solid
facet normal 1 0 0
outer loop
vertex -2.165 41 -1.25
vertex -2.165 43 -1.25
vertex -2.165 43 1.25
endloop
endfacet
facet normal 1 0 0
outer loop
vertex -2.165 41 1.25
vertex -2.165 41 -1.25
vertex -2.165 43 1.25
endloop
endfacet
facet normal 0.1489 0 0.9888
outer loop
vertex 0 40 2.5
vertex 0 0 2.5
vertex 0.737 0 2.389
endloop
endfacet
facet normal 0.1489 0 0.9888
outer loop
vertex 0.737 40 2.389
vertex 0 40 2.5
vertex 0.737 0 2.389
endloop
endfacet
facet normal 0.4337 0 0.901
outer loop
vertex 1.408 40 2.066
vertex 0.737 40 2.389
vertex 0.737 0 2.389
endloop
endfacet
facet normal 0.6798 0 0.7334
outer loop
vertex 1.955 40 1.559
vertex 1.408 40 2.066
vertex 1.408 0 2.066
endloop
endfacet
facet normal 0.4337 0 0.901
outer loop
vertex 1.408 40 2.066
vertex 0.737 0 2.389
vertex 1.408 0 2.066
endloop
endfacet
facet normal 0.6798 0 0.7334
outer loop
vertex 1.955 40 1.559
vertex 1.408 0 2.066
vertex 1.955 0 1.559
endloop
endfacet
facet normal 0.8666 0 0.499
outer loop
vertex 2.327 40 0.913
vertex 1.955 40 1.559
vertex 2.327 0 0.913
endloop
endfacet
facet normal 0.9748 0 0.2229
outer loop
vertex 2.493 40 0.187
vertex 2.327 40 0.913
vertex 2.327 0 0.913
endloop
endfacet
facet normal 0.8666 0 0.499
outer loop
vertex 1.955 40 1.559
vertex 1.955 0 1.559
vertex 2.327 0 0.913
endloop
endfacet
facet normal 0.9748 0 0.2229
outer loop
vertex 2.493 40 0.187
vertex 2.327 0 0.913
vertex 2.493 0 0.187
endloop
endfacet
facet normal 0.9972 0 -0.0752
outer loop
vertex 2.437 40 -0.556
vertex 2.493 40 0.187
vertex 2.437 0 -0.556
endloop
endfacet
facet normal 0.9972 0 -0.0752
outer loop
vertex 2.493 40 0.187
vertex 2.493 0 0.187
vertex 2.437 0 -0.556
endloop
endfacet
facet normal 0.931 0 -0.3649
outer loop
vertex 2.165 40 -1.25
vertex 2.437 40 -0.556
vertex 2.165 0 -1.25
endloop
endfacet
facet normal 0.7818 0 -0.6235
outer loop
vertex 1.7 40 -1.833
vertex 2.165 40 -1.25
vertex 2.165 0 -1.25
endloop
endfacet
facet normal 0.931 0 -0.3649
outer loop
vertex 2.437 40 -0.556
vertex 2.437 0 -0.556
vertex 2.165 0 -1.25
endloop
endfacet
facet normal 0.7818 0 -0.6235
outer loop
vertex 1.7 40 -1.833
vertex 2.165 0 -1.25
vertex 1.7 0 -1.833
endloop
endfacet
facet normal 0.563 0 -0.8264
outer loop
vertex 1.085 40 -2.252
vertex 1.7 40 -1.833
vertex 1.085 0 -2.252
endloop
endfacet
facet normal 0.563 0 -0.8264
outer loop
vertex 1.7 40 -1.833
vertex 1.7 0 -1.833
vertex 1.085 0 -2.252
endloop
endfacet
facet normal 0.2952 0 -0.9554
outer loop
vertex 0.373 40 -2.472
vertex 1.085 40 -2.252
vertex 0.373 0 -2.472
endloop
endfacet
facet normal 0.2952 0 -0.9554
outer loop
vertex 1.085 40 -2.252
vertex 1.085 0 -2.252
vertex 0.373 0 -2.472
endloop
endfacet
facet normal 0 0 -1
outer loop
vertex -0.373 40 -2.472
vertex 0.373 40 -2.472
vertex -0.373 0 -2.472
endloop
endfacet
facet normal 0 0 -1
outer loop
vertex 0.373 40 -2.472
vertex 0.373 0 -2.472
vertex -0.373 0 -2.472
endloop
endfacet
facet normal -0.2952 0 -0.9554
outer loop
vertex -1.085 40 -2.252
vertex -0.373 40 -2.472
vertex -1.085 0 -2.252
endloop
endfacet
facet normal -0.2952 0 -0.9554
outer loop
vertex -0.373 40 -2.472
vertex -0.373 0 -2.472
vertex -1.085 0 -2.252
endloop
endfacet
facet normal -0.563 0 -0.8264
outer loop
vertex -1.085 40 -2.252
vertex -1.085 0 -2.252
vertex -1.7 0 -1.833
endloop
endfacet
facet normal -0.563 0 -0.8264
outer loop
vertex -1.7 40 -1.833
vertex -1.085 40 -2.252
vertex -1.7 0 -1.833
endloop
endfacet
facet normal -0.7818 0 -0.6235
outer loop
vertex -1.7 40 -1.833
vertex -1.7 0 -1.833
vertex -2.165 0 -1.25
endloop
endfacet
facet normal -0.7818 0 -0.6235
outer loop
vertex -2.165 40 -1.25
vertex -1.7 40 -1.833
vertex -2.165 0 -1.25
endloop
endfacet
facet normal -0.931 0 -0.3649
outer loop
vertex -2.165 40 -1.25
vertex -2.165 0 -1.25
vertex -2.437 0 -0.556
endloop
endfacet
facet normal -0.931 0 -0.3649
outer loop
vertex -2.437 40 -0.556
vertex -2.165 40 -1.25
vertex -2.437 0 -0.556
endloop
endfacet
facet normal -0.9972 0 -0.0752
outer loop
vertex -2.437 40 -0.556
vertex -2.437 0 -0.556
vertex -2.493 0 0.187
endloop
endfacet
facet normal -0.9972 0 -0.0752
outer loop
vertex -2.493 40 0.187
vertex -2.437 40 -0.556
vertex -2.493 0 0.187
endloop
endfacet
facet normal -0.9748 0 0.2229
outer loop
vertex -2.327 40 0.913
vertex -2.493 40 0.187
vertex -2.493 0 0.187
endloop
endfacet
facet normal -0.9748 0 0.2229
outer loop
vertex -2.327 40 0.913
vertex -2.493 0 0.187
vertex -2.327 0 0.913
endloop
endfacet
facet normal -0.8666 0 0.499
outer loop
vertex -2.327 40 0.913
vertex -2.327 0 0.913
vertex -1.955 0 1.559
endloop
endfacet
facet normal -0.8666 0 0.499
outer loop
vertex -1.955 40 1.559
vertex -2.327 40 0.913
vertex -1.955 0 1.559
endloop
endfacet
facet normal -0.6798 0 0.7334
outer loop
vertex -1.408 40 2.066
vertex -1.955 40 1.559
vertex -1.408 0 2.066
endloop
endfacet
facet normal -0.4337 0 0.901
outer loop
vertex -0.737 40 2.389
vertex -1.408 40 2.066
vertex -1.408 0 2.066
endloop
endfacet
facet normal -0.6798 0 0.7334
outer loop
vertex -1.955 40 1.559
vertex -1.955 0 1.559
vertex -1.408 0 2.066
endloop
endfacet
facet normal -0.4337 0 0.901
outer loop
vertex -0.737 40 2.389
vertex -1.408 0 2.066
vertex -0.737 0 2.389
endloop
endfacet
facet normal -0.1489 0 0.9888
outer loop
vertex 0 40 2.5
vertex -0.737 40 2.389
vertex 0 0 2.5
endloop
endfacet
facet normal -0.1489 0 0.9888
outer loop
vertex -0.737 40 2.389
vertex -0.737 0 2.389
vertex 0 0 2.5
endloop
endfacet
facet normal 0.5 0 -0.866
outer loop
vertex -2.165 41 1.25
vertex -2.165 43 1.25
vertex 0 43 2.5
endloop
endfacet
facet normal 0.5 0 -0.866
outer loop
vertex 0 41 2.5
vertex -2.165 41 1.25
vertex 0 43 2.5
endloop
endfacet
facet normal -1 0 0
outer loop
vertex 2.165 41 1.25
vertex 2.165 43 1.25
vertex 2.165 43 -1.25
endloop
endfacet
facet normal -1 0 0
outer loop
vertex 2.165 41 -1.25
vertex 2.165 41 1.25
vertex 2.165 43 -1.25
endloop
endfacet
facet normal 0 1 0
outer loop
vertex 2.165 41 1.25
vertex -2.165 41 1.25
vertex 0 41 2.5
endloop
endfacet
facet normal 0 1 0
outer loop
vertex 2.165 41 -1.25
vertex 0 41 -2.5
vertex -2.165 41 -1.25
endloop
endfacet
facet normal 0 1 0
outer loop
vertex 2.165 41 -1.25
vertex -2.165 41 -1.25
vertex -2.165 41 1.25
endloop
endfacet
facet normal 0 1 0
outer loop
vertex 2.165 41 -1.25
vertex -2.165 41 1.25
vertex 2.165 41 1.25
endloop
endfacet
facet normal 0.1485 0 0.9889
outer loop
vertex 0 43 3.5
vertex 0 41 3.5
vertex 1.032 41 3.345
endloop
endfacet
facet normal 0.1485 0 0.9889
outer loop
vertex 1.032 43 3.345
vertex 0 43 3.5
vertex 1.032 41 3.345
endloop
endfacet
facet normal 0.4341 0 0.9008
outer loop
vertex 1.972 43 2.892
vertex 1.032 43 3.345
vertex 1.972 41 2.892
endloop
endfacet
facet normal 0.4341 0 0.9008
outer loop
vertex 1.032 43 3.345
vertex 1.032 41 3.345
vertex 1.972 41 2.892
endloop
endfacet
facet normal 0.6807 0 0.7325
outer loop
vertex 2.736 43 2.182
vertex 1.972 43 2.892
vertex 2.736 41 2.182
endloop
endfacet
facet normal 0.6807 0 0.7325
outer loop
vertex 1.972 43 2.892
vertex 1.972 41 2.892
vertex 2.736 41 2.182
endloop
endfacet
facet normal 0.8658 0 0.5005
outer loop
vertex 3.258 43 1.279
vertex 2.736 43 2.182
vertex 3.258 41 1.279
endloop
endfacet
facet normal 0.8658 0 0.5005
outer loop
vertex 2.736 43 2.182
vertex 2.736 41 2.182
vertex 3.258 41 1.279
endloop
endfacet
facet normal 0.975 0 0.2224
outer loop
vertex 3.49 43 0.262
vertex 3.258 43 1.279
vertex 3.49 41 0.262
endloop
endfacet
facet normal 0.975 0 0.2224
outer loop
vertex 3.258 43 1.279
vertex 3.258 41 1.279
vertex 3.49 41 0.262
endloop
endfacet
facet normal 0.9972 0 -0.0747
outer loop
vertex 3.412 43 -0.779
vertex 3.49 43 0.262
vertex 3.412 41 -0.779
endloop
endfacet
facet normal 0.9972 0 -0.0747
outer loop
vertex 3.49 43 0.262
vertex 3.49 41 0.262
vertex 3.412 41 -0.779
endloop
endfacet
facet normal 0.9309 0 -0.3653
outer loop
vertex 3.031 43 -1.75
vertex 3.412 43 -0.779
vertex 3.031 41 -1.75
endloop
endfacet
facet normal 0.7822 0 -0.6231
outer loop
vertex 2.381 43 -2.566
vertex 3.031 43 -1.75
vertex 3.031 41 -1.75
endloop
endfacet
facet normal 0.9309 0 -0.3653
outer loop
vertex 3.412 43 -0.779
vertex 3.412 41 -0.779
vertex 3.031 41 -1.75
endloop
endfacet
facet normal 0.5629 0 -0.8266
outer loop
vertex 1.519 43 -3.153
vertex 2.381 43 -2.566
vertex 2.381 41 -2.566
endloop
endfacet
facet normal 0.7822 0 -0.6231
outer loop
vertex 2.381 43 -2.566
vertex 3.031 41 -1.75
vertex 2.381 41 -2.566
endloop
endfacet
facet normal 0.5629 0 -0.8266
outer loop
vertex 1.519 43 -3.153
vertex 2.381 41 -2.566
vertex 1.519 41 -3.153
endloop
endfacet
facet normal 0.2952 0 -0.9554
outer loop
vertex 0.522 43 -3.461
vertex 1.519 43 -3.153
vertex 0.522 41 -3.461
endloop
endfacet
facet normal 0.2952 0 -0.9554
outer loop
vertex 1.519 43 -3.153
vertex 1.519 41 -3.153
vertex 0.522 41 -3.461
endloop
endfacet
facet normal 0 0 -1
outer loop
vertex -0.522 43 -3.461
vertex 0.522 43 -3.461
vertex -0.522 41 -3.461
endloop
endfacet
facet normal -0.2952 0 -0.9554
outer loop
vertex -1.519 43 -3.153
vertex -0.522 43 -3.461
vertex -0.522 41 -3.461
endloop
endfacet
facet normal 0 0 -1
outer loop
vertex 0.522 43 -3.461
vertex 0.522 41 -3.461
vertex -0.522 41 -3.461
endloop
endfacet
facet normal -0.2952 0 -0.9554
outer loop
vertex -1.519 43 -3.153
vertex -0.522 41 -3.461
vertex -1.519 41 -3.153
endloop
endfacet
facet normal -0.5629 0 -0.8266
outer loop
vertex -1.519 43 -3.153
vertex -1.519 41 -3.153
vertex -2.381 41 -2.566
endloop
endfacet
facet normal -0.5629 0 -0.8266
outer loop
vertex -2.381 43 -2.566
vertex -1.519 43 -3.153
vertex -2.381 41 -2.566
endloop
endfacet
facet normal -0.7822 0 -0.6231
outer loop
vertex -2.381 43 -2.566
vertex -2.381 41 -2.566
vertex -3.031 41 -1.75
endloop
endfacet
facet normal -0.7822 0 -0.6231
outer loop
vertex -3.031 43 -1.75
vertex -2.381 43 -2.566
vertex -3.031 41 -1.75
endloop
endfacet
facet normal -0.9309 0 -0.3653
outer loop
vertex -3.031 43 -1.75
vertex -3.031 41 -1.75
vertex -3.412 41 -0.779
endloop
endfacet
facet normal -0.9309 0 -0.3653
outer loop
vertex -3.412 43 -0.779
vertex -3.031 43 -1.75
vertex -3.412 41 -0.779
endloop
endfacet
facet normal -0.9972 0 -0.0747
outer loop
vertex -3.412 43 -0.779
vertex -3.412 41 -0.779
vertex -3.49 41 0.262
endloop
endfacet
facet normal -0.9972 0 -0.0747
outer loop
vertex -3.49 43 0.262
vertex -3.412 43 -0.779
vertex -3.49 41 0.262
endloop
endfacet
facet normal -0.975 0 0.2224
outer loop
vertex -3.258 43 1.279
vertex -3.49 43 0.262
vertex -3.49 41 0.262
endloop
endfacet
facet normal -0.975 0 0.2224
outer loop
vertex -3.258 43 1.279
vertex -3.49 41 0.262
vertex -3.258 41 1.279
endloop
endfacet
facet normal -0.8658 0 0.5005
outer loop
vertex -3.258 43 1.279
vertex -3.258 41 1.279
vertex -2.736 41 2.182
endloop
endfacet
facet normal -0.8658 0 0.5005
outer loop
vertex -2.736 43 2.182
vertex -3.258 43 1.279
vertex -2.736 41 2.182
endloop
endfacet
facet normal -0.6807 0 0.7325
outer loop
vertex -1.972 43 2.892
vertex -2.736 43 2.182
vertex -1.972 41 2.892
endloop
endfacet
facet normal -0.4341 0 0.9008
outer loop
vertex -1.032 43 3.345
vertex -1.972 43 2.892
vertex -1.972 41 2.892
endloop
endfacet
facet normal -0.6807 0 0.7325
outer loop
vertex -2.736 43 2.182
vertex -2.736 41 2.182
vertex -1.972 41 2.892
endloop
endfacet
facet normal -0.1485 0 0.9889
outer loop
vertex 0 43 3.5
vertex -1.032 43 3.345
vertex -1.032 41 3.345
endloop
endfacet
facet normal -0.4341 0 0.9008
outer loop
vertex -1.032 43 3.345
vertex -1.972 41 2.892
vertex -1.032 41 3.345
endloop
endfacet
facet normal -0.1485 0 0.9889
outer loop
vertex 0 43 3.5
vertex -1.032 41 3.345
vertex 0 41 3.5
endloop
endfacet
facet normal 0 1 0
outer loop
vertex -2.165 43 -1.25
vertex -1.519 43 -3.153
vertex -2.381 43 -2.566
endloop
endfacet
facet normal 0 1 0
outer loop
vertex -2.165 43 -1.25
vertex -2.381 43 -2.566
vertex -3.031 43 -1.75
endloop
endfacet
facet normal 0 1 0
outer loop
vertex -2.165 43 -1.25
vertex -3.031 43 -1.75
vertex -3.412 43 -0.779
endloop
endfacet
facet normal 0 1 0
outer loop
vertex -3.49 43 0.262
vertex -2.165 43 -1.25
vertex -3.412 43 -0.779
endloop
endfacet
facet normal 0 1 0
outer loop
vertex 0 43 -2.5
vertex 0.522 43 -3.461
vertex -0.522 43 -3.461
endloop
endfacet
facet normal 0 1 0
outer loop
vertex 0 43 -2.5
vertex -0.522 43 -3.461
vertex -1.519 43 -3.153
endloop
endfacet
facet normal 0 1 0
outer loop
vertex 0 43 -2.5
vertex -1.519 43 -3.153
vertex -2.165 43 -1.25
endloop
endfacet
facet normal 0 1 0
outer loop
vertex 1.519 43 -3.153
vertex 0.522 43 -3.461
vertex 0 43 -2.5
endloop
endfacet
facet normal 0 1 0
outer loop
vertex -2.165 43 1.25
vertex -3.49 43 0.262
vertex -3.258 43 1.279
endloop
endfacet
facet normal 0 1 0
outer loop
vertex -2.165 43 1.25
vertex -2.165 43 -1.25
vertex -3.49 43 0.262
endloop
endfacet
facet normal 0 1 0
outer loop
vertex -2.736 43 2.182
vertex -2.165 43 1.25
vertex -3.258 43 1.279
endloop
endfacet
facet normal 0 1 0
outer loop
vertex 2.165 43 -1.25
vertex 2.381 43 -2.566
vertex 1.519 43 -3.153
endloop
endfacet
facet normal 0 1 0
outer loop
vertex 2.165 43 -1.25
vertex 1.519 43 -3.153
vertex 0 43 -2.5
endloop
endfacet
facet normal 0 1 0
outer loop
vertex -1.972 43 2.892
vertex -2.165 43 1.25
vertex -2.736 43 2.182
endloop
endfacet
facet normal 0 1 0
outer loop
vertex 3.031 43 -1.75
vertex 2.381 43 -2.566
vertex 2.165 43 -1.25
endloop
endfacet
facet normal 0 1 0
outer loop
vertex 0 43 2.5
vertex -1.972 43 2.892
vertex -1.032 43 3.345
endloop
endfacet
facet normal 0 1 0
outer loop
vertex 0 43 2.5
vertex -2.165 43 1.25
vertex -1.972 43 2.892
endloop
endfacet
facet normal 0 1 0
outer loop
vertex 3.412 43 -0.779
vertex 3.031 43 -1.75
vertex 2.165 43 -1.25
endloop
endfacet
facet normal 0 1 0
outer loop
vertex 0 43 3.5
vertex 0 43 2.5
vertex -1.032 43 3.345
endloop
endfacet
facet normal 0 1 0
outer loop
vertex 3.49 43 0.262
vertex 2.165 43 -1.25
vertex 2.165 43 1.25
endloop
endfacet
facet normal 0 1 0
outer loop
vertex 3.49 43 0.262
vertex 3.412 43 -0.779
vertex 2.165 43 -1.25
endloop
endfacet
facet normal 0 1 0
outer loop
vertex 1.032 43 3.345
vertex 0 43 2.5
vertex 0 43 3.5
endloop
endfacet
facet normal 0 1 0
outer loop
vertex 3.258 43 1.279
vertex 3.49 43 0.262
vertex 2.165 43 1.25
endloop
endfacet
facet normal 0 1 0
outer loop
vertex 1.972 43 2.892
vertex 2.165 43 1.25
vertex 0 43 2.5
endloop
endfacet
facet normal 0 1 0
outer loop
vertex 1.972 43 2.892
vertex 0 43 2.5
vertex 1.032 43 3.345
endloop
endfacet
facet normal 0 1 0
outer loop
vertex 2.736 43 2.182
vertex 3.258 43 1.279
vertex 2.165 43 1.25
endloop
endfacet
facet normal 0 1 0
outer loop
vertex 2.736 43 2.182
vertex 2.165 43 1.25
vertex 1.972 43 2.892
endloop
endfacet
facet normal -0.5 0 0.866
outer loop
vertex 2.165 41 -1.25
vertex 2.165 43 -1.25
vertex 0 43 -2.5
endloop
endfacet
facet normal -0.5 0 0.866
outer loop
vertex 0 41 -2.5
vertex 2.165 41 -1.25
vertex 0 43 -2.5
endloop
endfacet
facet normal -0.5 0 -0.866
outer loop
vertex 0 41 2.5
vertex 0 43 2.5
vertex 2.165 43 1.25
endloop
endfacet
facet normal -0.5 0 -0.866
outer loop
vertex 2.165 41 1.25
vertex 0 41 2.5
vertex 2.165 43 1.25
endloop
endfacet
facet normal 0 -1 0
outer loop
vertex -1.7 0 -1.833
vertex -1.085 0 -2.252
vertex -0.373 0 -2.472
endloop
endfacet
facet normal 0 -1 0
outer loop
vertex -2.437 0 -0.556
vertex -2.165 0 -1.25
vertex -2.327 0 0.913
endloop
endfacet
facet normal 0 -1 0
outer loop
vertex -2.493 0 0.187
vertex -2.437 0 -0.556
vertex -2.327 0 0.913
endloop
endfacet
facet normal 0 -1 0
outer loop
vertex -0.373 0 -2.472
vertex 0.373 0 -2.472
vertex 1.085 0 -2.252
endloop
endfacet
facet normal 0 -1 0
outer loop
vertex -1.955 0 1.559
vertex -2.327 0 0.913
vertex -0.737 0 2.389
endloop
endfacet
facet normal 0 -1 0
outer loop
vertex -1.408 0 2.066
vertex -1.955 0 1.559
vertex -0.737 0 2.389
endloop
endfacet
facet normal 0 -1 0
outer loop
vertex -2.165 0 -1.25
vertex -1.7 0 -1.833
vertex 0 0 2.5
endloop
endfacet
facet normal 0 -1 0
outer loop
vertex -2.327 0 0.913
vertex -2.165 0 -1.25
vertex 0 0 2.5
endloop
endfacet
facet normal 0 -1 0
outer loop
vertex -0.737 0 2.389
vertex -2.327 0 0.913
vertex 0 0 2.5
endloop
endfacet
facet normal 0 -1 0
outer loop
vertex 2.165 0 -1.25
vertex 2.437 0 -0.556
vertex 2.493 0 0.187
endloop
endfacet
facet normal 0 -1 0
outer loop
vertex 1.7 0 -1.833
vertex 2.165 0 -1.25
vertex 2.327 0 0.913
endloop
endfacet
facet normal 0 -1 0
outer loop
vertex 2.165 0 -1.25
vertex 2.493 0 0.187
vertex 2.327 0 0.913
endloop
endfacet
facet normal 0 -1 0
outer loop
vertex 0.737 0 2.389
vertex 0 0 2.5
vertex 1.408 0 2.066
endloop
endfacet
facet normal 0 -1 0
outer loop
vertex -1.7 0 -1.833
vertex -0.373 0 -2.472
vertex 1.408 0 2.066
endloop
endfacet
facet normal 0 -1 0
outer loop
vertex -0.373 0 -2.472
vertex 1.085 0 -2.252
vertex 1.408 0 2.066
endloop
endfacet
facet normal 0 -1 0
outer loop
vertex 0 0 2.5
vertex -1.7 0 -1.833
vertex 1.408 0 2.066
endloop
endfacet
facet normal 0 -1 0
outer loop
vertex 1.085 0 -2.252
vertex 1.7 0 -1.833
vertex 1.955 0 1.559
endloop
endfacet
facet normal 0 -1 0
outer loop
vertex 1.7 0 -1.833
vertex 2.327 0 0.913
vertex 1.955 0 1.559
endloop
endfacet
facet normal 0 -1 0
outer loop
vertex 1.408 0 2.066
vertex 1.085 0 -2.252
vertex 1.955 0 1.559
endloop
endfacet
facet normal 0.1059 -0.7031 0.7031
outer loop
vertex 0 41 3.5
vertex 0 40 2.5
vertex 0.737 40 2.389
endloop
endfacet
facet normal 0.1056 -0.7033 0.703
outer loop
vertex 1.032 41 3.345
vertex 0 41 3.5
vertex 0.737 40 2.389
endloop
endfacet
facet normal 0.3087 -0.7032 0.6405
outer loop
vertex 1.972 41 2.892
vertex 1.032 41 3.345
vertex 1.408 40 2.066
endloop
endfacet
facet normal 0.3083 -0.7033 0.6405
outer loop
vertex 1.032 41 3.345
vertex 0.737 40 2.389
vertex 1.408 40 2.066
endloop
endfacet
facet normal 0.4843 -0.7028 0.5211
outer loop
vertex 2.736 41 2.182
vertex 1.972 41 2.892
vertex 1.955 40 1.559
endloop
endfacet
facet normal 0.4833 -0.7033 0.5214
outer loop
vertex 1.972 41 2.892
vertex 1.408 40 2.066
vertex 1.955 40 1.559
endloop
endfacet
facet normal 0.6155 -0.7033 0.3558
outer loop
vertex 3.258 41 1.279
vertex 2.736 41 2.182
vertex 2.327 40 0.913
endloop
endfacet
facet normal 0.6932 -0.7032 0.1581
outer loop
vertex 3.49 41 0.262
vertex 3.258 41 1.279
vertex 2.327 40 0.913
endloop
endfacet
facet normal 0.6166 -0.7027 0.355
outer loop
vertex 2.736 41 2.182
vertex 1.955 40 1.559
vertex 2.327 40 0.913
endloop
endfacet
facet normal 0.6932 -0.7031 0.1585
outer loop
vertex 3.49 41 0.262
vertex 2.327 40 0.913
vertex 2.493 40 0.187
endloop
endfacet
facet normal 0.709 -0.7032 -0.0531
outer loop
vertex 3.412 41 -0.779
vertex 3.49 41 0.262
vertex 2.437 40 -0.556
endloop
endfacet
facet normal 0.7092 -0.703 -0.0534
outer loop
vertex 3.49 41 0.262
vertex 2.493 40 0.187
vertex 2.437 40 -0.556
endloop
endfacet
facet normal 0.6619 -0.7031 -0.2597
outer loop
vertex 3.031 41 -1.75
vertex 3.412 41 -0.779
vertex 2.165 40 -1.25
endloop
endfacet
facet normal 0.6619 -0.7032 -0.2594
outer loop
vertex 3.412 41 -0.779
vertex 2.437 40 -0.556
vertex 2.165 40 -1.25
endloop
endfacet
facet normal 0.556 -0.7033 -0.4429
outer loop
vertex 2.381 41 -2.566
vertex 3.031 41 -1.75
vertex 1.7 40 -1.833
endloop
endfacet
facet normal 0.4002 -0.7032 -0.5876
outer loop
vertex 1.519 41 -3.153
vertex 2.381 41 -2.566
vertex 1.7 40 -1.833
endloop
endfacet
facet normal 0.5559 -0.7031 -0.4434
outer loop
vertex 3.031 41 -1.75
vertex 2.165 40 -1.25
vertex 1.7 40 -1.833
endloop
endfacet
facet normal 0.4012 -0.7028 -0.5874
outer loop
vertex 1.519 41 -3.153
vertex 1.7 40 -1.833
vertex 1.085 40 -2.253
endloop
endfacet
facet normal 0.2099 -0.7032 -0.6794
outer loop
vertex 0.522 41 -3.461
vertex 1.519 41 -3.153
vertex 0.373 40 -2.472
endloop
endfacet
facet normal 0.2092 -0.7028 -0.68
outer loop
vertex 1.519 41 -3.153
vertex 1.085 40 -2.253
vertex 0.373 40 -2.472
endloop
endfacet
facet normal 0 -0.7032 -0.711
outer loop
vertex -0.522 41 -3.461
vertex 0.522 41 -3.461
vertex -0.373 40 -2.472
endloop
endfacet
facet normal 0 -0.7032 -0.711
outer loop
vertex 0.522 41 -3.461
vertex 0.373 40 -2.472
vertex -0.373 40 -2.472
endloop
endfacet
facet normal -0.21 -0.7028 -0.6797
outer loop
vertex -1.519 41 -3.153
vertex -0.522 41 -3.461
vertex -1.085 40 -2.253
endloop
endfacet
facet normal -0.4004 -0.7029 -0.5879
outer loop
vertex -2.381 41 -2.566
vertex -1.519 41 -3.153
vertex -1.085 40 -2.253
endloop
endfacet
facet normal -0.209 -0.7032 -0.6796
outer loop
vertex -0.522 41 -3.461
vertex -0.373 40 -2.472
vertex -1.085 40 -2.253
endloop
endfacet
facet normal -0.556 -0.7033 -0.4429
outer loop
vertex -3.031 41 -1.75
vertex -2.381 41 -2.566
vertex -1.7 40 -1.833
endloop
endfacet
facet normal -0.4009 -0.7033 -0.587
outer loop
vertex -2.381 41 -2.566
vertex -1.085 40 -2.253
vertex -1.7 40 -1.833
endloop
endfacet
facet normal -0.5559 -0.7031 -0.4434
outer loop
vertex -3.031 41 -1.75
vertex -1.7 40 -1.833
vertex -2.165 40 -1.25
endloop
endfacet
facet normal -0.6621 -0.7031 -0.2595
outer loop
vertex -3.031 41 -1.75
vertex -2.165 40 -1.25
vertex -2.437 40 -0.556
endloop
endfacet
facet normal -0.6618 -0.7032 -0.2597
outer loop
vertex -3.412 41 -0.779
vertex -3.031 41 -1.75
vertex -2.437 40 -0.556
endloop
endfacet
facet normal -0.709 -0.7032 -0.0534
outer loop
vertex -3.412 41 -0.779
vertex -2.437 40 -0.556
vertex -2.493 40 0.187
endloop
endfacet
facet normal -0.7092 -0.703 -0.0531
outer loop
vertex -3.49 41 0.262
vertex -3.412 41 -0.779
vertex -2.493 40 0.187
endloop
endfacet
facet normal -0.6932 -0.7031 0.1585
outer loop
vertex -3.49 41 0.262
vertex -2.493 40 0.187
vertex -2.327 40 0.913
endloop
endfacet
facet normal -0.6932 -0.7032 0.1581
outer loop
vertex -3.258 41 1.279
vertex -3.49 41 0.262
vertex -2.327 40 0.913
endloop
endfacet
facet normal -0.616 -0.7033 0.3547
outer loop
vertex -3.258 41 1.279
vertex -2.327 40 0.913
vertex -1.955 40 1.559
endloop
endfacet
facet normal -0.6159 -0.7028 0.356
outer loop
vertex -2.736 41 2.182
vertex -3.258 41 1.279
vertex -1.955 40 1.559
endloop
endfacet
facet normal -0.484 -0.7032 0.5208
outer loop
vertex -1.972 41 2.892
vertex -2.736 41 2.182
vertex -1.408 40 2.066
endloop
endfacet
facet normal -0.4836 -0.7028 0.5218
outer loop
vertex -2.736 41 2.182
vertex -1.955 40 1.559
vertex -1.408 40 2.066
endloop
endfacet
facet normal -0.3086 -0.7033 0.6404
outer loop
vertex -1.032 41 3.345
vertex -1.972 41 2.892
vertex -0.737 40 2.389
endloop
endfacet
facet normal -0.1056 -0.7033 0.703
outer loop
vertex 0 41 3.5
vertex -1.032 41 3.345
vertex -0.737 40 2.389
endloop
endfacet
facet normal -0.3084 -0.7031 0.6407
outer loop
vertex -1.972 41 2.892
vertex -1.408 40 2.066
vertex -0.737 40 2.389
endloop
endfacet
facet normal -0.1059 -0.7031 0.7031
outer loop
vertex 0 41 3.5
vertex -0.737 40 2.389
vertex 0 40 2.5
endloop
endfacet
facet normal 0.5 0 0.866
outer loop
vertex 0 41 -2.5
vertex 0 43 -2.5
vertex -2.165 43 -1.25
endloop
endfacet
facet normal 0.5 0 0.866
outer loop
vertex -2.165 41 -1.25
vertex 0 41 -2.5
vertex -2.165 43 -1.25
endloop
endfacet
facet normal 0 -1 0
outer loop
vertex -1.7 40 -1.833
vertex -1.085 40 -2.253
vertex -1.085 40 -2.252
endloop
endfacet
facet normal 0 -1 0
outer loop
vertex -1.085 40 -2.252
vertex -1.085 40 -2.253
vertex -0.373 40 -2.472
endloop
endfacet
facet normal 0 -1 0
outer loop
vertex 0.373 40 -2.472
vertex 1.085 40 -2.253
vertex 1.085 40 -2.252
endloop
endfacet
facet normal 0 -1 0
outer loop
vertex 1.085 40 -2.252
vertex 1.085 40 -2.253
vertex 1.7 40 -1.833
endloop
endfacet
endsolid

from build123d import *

# Parameters (mm, degrees)
SKETCH1_R          = 2.5
SCREW_LENGTH_DEPTH = 40
SKETCH2_R          = 3.5
SCREW_CAP_DEPTH    = 3
SCREW_HOLE_DEPTH   = 2
CHAMFER1_SIZE      = 1


with BuildPart() as part:
    # Sketch1 → Screw Length (new body)
    with BuildSketch(Plane(origin=(0, 0, 0), x_dir=(1, 0, 0), z_dir=(0, 1, 0))):
        with Locations(Location((0, 0, 0), (0, 0, 270))):
            Circle(SKETCH1_R)
    extrude(amount=SCREW_LENGTH_DEPTH)

    # Sketch2 → Screw Cap (add)
    with BuildSketch(Plane(origin=(0, 40, 0), x_dir=(1, 0, 0), z_dir=(0, 1, 0))):
        with Locations(Location((0, 0, 0), (0, 0, 270))):
            Circle(SKETCH2_R)
    extrude(amount=SCREW_CAP_DEPTH)

    # Sketch3 → Screw Hole (cut)
    with BuildSketch(Plane(origin=(0, 43, 0), x_dir=(1, 0, 0), z_dir=(0, 1, 0))):
        Polygon((0, 2.5), (-2.165063509, 1.25), (-2.165063509, -1.25), (0, -2.5), (2.165063509, -1.25), (2.165063509, 1.25), align=None)
    extrude(amount=-SCREW_HOLE_DEPTH, mode=Mode.SUBTRACT)

    # Chamfer1
    chamfer1_edges = [part.edges().sort_by_distance(p)[0] for p in [
        (0, 40, -3.5),
    ]]
    chamfer(chamfer1_edges, length=CHAMFER1_SIZE - 0.0001)  # a hair under: the kernel refuses the full size


solid = part.part
